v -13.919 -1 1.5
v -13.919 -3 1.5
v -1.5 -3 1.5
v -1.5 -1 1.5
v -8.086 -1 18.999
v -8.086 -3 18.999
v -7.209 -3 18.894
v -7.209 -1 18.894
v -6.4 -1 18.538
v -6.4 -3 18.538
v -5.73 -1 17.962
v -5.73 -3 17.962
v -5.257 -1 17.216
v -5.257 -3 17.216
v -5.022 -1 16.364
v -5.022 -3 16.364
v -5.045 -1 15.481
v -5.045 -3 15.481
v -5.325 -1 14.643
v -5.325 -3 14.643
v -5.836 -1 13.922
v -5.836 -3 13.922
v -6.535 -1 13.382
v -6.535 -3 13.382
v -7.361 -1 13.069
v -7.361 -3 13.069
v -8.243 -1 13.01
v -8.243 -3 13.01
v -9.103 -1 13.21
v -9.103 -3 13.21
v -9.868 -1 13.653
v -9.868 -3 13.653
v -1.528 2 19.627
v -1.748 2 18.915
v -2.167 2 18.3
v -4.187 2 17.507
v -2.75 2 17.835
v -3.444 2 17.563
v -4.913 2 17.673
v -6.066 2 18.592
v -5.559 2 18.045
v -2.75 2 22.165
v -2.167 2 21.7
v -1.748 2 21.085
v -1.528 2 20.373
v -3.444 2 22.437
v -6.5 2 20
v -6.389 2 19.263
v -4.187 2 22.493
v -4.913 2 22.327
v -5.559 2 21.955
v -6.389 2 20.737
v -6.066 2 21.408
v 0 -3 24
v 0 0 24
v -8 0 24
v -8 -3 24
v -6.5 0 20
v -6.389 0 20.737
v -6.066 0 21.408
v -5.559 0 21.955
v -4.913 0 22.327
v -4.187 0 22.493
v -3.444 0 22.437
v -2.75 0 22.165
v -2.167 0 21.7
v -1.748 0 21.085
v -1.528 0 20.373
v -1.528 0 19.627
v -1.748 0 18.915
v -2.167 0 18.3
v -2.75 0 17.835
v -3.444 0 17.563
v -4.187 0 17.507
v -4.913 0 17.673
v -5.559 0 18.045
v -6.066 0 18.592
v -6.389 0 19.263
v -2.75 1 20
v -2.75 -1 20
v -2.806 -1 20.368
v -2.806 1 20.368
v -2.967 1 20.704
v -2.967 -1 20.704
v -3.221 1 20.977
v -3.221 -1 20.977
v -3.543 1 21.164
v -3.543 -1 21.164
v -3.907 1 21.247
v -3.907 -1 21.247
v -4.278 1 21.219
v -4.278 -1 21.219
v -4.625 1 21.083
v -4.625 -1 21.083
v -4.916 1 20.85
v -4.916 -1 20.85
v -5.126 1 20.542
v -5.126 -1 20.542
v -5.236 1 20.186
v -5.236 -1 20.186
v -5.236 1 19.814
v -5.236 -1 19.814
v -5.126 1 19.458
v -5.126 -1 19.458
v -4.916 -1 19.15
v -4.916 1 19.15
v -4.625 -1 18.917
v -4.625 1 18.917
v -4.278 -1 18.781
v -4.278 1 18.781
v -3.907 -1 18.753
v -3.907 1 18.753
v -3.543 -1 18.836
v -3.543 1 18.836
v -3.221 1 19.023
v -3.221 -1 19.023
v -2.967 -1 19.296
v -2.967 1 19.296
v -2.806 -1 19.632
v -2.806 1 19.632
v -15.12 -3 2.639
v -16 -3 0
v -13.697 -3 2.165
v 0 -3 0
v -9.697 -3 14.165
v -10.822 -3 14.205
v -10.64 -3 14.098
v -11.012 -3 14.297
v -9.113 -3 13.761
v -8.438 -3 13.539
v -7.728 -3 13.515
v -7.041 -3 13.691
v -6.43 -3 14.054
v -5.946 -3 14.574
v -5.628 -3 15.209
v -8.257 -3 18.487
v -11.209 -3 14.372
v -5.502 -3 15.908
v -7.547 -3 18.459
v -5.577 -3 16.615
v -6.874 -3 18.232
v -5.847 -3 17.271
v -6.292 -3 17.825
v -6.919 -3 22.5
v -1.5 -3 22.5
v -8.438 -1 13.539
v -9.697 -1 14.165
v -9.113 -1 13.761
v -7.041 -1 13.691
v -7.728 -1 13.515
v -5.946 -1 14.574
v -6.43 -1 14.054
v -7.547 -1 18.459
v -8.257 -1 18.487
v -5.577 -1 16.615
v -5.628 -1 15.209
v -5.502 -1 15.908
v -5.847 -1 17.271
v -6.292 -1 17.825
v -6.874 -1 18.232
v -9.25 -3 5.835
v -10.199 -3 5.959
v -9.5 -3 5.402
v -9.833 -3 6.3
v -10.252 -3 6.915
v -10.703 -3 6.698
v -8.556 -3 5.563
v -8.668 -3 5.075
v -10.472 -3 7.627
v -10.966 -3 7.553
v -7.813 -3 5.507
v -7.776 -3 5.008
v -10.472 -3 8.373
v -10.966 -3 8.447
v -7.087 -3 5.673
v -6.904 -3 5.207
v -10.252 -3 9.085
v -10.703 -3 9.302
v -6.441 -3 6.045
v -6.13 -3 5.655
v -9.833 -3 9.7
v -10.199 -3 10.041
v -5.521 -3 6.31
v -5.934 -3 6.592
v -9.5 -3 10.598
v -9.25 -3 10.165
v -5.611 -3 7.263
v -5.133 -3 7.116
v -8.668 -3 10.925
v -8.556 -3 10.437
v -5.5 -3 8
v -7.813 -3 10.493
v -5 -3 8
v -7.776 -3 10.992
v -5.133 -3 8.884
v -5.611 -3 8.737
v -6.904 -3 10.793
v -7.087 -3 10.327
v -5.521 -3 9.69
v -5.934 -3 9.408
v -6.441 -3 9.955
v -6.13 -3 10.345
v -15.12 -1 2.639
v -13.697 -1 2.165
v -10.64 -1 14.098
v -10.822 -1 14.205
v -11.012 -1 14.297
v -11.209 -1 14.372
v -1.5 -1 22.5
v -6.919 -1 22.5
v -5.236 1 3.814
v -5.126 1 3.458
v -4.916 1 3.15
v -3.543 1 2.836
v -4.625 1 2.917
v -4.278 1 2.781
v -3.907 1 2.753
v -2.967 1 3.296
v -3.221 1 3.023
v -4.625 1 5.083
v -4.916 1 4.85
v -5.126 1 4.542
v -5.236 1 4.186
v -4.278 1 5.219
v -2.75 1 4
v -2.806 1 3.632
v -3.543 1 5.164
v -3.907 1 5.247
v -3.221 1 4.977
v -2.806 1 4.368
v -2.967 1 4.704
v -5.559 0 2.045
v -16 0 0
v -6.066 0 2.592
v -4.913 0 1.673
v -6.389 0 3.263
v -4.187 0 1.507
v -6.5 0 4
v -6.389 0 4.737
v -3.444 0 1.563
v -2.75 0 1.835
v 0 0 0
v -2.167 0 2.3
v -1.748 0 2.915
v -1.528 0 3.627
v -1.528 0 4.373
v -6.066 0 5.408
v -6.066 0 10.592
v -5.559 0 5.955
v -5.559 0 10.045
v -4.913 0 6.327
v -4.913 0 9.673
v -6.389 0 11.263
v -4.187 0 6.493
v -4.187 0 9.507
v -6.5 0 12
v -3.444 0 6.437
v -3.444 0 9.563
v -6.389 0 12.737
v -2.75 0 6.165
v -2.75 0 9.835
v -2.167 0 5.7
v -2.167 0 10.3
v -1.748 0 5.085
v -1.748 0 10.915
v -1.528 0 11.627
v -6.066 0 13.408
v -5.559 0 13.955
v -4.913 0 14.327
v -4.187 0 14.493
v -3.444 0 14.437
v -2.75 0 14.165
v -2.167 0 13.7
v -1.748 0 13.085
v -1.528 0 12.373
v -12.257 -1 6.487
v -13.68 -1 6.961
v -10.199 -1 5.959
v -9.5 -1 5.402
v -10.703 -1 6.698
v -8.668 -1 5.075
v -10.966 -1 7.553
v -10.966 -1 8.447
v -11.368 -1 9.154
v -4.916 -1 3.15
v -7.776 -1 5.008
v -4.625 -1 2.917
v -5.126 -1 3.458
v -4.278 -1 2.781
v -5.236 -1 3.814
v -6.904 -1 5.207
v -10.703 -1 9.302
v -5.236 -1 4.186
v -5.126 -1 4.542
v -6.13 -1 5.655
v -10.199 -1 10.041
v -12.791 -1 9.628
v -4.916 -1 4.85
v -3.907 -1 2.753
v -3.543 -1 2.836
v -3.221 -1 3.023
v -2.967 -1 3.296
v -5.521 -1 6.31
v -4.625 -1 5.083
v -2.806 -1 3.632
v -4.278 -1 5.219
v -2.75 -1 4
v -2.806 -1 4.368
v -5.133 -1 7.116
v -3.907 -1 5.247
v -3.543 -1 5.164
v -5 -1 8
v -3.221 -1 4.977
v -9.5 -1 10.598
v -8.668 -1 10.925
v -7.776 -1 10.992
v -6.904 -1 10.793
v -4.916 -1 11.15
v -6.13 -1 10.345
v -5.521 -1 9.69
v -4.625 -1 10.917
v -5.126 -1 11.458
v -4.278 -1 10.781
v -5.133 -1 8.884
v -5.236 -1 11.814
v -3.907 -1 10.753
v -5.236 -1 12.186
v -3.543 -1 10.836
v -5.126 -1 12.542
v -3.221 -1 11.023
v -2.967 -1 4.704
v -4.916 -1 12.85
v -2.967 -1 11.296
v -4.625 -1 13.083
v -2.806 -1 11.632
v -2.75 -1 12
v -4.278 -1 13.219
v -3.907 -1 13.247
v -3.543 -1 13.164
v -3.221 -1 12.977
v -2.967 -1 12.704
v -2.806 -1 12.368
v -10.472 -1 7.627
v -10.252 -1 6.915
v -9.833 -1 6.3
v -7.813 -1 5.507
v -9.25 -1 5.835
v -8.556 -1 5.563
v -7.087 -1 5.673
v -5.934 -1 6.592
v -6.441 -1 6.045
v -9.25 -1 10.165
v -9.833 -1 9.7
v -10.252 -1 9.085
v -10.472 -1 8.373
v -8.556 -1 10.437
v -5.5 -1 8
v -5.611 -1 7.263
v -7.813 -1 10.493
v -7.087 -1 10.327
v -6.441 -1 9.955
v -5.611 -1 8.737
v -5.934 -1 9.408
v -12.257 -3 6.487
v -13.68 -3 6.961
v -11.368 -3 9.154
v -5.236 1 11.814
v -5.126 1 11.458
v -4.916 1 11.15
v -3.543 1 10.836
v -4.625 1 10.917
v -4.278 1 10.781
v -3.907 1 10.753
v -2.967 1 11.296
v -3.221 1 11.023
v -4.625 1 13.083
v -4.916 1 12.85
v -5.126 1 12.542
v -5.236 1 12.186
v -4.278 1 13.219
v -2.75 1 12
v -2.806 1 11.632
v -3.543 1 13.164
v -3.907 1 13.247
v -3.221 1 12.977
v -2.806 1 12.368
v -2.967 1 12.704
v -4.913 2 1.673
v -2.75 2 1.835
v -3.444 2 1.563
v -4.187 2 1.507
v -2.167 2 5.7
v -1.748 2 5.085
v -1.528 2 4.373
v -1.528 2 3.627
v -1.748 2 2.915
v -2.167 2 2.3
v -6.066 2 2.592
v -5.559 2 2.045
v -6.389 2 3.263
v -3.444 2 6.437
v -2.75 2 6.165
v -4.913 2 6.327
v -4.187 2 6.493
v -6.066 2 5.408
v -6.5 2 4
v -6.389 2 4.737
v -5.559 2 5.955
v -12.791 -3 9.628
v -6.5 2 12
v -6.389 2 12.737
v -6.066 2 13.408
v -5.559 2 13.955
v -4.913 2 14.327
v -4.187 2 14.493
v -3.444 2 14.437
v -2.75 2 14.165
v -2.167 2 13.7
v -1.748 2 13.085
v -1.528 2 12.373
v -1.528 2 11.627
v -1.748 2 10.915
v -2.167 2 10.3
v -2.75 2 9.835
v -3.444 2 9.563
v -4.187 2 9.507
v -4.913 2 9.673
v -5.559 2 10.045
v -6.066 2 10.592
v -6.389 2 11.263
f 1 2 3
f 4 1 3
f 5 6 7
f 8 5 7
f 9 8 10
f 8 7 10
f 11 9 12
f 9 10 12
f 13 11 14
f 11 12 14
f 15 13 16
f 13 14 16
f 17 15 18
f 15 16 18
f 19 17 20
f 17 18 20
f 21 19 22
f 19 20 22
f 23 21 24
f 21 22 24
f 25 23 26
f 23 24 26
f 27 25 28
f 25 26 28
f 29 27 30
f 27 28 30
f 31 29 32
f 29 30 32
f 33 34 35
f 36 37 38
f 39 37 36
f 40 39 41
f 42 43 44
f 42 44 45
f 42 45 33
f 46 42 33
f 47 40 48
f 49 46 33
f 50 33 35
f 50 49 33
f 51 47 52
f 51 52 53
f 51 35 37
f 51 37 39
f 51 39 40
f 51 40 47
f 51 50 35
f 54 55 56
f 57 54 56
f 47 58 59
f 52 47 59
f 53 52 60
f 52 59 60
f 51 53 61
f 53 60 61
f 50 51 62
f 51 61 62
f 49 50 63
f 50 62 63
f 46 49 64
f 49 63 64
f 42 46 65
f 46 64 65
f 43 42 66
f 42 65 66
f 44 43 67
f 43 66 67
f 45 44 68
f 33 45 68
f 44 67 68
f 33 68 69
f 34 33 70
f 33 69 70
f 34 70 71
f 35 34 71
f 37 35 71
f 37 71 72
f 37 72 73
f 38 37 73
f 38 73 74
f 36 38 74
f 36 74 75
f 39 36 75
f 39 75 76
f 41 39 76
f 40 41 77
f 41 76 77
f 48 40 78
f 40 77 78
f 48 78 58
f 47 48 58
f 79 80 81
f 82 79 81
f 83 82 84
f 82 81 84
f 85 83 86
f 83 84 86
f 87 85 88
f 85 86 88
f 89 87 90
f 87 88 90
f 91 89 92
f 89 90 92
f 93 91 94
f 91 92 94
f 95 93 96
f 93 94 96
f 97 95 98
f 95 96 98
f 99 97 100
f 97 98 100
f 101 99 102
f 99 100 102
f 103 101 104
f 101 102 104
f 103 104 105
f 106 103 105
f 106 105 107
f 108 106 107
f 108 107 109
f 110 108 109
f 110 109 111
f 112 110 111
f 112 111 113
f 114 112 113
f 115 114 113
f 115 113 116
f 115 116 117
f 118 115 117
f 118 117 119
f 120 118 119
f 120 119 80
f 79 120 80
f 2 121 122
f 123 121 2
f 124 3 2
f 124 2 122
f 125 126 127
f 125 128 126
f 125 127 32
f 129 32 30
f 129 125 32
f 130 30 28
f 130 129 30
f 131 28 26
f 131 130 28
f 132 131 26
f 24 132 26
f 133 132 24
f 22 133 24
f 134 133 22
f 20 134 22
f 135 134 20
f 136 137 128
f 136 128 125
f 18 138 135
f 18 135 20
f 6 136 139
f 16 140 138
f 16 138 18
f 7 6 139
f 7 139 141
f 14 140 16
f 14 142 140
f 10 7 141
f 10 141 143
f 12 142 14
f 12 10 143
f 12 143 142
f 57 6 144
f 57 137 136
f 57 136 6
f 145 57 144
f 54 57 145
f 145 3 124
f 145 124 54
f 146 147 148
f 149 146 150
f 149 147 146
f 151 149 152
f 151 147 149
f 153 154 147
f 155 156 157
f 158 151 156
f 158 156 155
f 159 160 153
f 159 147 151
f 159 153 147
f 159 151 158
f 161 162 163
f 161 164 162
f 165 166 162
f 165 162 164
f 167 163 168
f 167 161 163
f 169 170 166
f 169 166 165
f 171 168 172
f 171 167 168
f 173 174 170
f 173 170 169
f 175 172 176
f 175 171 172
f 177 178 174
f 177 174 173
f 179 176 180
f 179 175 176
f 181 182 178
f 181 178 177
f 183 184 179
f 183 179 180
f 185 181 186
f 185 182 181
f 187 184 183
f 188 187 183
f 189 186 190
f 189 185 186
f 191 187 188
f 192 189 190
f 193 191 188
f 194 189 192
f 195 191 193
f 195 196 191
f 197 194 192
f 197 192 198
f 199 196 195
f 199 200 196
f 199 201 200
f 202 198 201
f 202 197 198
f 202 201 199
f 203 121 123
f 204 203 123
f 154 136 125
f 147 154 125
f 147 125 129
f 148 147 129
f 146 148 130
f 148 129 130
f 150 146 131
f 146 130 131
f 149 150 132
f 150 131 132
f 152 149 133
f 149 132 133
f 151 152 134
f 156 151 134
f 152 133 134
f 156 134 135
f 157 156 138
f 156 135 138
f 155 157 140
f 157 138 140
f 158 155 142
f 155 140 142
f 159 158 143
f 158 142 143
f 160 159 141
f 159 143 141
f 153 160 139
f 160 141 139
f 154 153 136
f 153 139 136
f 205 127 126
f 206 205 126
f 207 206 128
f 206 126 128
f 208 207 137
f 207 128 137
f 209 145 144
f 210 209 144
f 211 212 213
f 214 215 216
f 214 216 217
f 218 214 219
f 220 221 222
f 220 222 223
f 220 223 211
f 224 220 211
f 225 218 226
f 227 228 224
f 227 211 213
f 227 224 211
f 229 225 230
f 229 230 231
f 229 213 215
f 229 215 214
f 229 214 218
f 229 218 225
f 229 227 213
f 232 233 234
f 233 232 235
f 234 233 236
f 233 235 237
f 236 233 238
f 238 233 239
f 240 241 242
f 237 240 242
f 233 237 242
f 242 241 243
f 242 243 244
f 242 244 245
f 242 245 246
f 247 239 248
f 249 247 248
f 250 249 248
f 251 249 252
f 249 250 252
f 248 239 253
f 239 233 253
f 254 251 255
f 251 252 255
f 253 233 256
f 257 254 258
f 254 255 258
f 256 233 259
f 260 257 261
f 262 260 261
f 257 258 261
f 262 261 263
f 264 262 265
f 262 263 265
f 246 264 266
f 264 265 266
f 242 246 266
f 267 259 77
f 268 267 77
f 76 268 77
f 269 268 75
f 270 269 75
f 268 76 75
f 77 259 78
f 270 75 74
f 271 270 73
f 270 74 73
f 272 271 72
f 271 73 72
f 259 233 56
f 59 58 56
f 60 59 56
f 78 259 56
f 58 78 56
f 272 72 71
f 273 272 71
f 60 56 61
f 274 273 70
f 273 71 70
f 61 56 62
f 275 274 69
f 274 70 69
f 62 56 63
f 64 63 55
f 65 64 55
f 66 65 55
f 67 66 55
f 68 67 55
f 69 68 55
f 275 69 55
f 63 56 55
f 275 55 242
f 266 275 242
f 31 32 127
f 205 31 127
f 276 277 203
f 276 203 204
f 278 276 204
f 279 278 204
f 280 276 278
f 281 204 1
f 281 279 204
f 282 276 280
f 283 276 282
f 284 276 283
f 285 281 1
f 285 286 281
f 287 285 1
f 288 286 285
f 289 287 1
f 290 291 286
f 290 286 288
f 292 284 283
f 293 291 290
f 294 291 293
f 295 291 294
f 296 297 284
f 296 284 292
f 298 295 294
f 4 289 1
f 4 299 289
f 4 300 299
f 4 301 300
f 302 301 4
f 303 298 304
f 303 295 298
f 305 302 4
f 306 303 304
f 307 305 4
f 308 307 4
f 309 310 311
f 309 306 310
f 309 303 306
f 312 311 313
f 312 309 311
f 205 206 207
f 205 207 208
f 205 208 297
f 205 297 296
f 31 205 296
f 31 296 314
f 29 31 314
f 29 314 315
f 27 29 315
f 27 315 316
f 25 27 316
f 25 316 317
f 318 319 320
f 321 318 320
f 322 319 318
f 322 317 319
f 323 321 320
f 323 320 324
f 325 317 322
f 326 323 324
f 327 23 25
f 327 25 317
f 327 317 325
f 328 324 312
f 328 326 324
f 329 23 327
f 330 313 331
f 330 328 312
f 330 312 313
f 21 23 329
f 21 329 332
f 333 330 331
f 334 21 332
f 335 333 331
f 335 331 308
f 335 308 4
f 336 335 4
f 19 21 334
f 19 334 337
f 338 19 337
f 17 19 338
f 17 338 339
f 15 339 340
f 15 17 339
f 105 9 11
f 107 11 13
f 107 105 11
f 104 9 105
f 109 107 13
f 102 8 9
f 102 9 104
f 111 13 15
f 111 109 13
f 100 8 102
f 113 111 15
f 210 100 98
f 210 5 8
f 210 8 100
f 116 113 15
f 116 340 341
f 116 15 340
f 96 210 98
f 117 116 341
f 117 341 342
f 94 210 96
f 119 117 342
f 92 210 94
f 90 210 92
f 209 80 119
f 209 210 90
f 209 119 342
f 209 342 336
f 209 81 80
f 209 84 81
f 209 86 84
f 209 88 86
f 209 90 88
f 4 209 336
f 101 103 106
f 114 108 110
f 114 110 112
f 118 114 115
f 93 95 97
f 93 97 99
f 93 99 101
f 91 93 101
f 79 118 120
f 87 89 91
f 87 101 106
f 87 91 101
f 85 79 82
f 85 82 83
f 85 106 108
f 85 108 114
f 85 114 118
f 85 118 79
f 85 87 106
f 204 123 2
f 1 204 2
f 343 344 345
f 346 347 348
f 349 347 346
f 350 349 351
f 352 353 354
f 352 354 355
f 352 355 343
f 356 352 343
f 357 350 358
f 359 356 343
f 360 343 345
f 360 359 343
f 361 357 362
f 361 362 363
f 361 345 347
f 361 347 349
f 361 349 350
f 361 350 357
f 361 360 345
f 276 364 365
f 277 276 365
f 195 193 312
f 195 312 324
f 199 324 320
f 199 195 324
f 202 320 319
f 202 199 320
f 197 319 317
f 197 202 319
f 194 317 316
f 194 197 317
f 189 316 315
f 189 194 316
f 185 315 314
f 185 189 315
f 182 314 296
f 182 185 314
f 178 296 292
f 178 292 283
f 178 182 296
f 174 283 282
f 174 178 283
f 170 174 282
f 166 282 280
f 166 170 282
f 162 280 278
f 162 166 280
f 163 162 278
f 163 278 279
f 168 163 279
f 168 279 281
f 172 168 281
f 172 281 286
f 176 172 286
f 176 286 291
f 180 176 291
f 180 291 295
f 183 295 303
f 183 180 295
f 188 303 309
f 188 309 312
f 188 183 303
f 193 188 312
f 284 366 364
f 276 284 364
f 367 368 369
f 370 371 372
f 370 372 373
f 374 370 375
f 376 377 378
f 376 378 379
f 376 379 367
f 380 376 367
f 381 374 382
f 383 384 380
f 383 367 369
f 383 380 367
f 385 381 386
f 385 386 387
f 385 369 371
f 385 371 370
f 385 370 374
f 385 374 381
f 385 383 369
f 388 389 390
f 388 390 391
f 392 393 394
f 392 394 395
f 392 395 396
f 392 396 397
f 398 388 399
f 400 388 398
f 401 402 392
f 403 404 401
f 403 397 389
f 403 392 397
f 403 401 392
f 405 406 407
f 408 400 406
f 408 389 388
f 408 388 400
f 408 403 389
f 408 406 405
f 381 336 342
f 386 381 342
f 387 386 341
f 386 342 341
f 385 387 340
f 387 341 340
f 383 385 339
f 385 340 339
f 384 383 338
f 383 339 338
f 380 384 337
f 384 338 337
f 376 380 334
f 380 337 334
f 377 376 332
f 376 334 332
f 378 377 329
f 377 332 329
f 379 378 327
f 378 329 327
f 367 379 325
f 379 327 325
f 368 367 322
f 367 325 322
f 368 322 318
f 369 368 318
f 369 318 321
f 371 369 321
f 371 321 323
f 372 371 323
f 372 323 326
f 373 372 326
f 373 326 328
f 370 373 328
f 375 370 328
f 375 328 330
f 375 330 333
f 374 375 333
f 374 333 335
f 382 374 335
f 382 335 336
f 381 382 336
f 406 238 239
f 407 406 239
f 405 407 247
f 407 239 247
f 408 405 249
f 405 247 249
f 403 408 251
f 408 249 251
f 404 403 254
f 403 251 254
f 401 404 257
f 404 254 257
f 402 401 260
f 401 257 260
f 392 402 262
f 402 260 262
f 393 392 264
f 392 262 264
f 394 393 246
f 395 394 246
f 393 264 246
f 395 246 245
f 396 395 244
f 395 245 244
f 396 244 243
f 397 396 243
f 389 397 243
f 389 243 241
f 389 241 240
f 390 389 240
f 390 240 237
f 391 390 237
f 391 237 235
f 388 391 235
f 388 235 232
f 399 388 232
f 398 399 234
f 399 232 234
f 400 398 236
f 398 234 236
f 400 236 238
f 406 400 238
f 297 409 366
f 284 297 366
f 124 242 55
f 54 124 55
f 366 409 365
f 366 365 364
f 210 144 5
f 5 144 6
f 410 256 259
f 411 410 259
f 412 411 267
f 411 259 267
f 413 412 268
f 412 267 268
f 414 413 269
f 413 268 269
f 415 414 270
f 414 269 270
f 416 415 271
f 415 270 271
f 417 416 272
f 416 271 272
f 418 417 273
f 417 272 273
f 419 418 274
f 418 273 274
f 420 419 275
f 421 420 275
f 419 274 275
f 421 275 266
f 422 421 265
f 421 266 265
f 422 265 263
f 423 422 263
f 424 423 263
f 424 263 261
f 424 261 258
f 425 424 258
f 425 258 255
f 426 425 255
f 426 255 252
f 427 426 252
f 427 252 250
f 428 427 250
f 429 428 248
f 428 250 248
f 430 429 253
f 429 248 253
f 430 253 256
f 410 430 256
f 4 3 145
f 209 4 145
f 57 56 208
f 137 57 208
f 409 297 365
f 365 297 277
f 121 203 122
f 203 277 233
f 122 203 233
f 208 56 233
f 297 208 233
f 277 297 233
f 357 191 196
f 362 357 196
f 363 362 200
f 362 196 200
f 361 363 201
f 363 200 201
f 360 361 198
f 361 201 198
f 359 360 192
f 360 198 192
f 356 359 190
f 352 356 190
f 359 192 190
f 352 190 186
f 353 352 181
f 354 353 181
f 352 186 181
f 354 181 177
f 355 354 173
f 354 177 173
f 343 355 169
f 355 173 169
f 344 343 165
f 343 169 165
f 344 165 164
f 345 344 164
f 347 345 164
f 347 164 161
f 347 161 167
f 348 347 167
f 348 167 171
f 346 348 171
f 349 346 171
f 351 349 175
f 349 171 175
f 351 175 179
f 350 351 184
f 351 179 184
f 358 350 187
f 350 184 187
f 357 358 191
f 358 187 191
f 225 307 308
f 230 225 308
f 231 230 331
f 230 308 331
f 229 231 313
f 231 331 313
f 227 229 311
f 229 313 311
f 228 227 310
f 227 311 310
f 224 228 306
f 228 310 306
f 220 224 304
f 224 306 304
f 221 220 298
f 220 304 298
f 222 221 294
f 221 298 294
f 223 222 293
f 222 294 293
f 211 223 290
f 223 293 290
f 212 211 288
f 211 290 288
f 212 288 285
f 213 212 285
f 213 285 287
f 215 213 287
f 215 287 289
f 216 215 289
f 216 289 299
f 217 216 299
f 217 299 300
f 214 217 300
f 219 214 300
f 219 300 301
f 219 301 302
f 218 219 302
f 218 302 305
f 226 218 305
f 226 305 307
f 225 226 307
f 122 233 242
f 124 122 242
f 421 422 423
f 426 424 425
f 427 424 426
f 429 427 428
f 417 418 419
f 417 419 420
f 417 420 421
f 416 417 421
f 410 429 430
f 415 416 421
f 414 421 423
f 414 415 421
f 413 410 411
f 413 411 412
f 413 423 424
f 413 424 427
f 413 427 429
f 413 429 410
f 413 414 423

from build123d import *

# Parameters (mm, degrees)
F1_DEPTH = 3
F2_R     = 2.5
F3_DEPTH = 2
F4_R     = 1.25
F5_DEPTH = 4
F6_R     = 3
F6_R_2   = 2.5
F7_DEPTH = 2


with BuildPart() as f1:
    # F0 (on Front) → F1 (new body)
    with BuildSketch(Plane.XZ):
        Polygon((-16, 0), (0, 0), (0, 24), (-8, 24), align=None)
    extrude(amount=F1_DEPTH)

    # F2 (on face) → F3 (join)
    with BuildSketch(Plane(origin=(0, 0, 0), x_dir=(-1, 0, 0), z_dir=(0, 1, 0))):
        with Locations((4, 20)):
            Circle(F2_R)
        with Locations((4, 12)):
            Circle(F2_R)
        with Locations((4, 4)):
            Circle(F2_R)
    extrude(amount=F3_DEPTH)

    # F4 (on face) → F5 (cut)
    with BuildSketch(Plane.XZ.offset(3)):
        with Locations((-4, 20)):
            Circle(F4_R)
        with Locations((-4, 12)):
            Circle(F4_R)
        with Locations((-4, 4)):
            Circle(F4_R)
    extrude(amount=-F5_DEPTH, mode=Mode.SUBTRACT)

    # F6 (on face) → F7 (cut)
    with BuildSketch(Plane.XZ.offset(3)):
        with BuildLine():
            Line((-13.9188611699, 1.5), (-1.5, 1.5))
            Line((-1.5, 1.5), (-1.5, 22.5))
            Line((-1.5, 22.5), (-6.9188611699, 22.5))
            Line((-6.9188611699, 22.5), (-8.0859382195, 18.9987688511))
            ThreePointArc((-8.0859382195, 18.9987688511), (-5.1539501058, 15.0513167019), (-9.8680118863, 13.6525478508))
            Line((-9.8680118863, 13.6525478508), (-10.6400973399, 14.0977761451))
            ThreePointArc((-10.6400973399, 14.0977761451), (-10.9160755398, 14.2527999833), (-11.209430585, 14.3717082451))
            Line((-11.209430585, 14.3717082451), (-12.790569415, 9.6282917549))
            Line((-12.790569415, 9.6282917549), (-11.367544468, 9.1539501058))
            Line((-11.367544468, 9.1539501058), (-12.2565955429, 6.486796881))
            Line((-12.2565955429, 6.486796881), (-13.67962049, 6.96113853))
            Line((-13.67962049, 6.96113853), (-15.12037951, 2.63886147))
            Line((-15.12037951, 2.63886147), (-13.6973545629, 2.1645198209))
            Line((-13.6973545629, 2.1645198209), (-13.9188611699, 1.5))
        make_face()
        with Locations((-8, 8)):
            Circle(F6_R, mode=Mode.SUBTRACT)
        with BuildLine():
            Line((-8.2565955429, 18.486796881), (-9.6973545629, 14.1645198209))
            ThreePointArc((-9.6973545629, 14.1645198209), (-5.6282917549, 15.209430585), (-8.2565955429, 18.486796881))
        make_face()
        with Locations((-8, 8)):
            Circle(F6_R_2)
    extrude(amount=-F7_DEPTH, mode=Mode.SUBTRACT)


solid = f1.part
